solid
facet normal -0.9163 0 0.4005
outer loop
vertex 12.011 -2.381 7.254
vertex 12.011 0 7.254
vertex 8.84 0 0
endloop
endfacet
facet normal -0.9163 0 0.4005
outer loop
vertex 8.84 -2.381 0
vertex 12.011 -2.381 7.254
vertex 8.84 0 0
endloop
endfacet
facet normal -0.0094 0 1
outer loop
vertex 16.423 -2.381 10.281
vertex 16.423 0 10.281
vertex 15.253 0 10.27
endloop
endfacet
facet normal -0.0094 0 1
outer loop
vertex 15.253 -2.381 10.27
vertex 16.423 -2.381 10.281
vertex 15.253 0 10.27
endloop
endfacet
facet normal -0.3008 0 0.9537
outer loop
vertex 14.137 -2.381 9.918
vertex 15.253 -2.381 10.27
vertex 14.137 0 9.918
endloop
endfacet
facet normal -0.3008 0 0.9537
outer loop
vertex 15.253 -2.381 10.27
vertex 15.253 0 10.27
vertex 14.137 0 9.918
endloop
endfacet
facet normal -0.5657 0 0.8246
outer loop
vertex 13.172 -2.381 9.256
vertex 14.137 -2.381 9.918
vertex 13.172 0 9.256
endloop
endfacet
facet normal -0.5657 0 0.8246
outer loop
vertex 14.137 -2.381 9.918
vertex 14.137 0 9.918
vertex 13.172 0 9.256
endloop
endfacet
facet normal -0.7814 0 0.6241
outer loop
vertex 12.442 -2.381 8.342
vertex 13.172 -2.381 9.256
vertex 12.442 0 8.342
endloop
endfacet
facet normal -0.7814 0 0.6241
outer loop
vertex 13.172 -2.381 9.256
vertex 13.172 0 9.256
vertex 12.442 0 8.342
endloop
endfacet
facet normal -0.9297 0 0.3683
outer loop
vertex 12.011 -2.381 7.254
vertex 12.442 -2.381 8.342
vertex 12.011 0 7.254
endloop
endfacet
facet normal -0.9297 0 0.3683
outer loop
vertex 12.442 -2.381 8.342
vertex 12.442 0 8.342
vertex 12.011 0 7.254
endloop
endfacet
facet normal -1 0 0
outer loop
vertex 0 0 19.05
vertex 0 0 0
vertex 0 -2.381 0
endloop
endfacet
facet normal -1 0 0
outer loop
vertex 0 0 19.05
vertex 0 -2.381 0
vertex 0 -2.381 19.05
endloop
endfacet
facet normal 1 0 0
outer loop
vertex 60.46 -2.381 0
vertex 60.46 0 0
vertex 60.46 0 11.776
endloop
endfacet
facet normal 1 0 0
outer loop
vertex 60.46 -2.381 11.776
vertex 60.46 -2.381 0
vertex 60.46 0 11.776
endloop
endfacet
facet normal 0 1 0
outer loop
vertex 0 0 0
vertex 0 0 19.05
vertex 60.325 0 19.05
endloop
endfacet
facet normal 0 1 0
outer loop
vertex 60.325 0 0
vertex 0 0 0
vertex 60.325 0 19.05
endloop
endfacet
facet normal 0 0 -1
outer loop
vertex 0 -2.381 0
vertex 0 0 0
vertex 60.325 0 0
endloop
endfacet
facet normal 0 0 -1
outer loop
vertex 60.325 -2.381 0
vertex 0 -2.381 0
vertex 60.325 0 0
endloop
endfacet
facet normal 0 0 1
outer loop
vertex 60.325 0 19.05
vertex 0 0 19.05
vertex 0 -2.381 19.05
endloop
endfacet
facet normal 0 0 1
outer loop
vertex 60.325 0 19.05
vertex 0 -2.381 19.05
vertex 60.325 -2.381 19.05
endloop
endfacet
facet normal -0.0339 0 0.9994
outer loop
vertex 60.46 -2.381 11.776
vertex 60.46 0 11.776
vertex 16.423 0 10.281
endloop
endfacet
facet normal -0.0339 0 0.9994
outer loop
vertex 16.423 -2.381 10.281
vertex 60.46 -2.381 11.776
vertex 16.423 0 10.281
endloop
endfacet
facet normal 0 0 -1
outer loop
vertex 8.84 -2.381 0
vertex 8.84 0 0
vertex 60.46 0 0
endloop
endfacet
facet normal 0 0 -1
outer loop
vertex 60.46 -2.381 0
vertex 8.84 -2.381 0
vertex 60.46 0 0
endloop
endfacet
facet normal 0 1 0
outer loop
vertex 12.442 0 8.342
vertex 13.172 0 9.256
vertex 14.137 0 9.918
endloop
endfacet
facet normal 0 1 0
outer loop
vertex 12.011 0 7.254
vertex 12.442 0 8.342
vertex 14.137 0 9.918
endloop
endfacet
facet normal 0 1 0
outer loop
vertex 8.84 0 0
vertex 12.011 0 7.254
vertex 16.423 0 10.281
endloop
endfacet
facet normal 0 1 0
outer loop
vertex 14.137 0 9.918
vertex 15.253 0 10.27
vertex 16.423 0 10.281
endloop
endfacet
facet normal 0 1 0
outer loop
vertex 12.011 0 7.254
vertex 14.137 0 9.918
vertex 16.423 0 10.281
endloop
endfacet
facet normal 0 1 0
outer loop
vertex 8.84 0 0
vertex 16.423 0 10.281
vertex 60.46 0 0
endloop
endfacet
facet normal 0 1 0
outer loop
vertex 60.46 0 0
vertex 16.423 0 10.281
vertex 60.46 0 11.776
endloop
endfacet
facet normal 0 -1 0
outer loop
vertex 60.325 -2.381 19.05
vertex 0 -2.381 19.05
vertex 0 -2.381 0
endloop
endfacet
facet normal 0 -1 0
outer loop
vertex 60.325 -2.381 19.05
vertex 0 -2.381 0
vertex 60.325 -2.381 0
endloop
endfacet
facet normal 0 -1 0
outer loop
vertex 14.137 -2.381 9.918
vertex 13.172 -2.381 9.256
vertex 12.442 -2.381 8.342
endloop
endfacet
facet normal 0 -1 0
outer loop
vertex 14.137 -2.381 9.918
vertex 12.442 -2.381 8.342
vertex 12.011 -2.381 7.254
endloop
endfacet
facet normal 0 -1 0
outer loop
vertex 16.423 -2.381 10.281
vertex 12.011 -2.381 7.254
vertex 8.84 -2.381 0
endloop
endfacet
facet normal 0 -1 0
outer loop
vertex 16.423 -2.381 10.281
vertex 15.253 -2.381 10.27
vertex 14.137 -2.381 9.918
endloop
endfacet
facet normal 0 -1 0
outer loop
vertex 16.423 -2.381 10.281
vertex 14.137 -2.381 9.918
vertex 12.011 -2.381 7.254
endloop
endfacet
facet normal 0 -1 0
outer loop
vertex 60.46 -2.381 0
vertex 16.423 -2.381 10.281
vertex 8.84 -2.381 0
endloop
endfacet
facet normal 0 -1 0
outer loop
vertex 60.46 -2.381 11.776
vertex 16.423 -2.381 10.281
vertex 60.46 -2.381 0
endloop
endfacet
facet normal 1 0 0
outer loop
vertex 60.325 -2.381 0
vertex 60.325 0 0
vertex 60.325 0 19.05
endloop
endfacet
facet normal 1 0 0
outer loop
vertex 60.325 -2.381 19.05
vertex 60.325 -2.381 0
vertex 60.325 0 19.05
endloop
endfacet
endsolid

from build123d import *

# Parameters (mm, degrees)
F2_DEPTH = 2.38125
F0_W     = 60.325
F0_H     = 19.05


# Not quite as in the source:
# - a feature of the source that left no trace in its solid (it failed there, or was rolled back) is left out


with BuildPart() as f2:
    # F1 (on Front) → F2 (new body)
    with BuildSketch(Plane.XZ):
        with BuildLine():
            ThreePointArc((12.0106148621, 7.2541593159), (15.4199186631, 2.407427548), (19.84375, 6.35))
            ThreePointArc((19.84375, 6.35), (18.8687445476, 8.9554692756), (16.4227886665, 10.2807638112))
            ThreePointArc((16.4227886665, 10.2807638112), (13.7755602888, 9.4105561157), (12.0106148621, 7.2541593159))
        make_face()
        with BuildLine():
            ThreePointArc((16.4227886665, 10.2807638112), (18.8687445476, 8.9554692756), (19.84375, 6.35))
            ThreePointArc((19.84375, 6.35), (15.4199186631, 2.407427548), (12.0106148621, 7.2541593159))
            Line((12.0106148621, 7.2541593159), (8.8399816304, 0))
            Line((8.8399816304, 0), (60.4599677026, 0))
            Line((60.4599677026, 0), (60.4599677026, 11.7762926966))
            Line((60.4599677026, 11.7762926966), (16.4227886665, 10.2807638112))
        make_face()
        with BuildLine():
            ThreePointArc((12.0106148621, 7.2541593159), (13.7755602888, 9.4105561157), (16.4227886665, 10.2807638112))
            ThreePointArc((16.4227886665, 10.2807638112), (13.6299973872, 9.6227572216), (12.0106148621, 7.2541593159))
        make_face()
    extrude(amount=F2_DEPTH)


with BuildPart() as f2b:
    # F0 (on Front) → F2, piece 2 (new body)
    with BuildSketch(Plane.XZ):
        with Locations((30.1625, 9.525)):
            Rectangle(F0_W, F0_H)
    extrude(amount=F2_DEPTH)


solid = Compound([f2.part, f2b.part])
